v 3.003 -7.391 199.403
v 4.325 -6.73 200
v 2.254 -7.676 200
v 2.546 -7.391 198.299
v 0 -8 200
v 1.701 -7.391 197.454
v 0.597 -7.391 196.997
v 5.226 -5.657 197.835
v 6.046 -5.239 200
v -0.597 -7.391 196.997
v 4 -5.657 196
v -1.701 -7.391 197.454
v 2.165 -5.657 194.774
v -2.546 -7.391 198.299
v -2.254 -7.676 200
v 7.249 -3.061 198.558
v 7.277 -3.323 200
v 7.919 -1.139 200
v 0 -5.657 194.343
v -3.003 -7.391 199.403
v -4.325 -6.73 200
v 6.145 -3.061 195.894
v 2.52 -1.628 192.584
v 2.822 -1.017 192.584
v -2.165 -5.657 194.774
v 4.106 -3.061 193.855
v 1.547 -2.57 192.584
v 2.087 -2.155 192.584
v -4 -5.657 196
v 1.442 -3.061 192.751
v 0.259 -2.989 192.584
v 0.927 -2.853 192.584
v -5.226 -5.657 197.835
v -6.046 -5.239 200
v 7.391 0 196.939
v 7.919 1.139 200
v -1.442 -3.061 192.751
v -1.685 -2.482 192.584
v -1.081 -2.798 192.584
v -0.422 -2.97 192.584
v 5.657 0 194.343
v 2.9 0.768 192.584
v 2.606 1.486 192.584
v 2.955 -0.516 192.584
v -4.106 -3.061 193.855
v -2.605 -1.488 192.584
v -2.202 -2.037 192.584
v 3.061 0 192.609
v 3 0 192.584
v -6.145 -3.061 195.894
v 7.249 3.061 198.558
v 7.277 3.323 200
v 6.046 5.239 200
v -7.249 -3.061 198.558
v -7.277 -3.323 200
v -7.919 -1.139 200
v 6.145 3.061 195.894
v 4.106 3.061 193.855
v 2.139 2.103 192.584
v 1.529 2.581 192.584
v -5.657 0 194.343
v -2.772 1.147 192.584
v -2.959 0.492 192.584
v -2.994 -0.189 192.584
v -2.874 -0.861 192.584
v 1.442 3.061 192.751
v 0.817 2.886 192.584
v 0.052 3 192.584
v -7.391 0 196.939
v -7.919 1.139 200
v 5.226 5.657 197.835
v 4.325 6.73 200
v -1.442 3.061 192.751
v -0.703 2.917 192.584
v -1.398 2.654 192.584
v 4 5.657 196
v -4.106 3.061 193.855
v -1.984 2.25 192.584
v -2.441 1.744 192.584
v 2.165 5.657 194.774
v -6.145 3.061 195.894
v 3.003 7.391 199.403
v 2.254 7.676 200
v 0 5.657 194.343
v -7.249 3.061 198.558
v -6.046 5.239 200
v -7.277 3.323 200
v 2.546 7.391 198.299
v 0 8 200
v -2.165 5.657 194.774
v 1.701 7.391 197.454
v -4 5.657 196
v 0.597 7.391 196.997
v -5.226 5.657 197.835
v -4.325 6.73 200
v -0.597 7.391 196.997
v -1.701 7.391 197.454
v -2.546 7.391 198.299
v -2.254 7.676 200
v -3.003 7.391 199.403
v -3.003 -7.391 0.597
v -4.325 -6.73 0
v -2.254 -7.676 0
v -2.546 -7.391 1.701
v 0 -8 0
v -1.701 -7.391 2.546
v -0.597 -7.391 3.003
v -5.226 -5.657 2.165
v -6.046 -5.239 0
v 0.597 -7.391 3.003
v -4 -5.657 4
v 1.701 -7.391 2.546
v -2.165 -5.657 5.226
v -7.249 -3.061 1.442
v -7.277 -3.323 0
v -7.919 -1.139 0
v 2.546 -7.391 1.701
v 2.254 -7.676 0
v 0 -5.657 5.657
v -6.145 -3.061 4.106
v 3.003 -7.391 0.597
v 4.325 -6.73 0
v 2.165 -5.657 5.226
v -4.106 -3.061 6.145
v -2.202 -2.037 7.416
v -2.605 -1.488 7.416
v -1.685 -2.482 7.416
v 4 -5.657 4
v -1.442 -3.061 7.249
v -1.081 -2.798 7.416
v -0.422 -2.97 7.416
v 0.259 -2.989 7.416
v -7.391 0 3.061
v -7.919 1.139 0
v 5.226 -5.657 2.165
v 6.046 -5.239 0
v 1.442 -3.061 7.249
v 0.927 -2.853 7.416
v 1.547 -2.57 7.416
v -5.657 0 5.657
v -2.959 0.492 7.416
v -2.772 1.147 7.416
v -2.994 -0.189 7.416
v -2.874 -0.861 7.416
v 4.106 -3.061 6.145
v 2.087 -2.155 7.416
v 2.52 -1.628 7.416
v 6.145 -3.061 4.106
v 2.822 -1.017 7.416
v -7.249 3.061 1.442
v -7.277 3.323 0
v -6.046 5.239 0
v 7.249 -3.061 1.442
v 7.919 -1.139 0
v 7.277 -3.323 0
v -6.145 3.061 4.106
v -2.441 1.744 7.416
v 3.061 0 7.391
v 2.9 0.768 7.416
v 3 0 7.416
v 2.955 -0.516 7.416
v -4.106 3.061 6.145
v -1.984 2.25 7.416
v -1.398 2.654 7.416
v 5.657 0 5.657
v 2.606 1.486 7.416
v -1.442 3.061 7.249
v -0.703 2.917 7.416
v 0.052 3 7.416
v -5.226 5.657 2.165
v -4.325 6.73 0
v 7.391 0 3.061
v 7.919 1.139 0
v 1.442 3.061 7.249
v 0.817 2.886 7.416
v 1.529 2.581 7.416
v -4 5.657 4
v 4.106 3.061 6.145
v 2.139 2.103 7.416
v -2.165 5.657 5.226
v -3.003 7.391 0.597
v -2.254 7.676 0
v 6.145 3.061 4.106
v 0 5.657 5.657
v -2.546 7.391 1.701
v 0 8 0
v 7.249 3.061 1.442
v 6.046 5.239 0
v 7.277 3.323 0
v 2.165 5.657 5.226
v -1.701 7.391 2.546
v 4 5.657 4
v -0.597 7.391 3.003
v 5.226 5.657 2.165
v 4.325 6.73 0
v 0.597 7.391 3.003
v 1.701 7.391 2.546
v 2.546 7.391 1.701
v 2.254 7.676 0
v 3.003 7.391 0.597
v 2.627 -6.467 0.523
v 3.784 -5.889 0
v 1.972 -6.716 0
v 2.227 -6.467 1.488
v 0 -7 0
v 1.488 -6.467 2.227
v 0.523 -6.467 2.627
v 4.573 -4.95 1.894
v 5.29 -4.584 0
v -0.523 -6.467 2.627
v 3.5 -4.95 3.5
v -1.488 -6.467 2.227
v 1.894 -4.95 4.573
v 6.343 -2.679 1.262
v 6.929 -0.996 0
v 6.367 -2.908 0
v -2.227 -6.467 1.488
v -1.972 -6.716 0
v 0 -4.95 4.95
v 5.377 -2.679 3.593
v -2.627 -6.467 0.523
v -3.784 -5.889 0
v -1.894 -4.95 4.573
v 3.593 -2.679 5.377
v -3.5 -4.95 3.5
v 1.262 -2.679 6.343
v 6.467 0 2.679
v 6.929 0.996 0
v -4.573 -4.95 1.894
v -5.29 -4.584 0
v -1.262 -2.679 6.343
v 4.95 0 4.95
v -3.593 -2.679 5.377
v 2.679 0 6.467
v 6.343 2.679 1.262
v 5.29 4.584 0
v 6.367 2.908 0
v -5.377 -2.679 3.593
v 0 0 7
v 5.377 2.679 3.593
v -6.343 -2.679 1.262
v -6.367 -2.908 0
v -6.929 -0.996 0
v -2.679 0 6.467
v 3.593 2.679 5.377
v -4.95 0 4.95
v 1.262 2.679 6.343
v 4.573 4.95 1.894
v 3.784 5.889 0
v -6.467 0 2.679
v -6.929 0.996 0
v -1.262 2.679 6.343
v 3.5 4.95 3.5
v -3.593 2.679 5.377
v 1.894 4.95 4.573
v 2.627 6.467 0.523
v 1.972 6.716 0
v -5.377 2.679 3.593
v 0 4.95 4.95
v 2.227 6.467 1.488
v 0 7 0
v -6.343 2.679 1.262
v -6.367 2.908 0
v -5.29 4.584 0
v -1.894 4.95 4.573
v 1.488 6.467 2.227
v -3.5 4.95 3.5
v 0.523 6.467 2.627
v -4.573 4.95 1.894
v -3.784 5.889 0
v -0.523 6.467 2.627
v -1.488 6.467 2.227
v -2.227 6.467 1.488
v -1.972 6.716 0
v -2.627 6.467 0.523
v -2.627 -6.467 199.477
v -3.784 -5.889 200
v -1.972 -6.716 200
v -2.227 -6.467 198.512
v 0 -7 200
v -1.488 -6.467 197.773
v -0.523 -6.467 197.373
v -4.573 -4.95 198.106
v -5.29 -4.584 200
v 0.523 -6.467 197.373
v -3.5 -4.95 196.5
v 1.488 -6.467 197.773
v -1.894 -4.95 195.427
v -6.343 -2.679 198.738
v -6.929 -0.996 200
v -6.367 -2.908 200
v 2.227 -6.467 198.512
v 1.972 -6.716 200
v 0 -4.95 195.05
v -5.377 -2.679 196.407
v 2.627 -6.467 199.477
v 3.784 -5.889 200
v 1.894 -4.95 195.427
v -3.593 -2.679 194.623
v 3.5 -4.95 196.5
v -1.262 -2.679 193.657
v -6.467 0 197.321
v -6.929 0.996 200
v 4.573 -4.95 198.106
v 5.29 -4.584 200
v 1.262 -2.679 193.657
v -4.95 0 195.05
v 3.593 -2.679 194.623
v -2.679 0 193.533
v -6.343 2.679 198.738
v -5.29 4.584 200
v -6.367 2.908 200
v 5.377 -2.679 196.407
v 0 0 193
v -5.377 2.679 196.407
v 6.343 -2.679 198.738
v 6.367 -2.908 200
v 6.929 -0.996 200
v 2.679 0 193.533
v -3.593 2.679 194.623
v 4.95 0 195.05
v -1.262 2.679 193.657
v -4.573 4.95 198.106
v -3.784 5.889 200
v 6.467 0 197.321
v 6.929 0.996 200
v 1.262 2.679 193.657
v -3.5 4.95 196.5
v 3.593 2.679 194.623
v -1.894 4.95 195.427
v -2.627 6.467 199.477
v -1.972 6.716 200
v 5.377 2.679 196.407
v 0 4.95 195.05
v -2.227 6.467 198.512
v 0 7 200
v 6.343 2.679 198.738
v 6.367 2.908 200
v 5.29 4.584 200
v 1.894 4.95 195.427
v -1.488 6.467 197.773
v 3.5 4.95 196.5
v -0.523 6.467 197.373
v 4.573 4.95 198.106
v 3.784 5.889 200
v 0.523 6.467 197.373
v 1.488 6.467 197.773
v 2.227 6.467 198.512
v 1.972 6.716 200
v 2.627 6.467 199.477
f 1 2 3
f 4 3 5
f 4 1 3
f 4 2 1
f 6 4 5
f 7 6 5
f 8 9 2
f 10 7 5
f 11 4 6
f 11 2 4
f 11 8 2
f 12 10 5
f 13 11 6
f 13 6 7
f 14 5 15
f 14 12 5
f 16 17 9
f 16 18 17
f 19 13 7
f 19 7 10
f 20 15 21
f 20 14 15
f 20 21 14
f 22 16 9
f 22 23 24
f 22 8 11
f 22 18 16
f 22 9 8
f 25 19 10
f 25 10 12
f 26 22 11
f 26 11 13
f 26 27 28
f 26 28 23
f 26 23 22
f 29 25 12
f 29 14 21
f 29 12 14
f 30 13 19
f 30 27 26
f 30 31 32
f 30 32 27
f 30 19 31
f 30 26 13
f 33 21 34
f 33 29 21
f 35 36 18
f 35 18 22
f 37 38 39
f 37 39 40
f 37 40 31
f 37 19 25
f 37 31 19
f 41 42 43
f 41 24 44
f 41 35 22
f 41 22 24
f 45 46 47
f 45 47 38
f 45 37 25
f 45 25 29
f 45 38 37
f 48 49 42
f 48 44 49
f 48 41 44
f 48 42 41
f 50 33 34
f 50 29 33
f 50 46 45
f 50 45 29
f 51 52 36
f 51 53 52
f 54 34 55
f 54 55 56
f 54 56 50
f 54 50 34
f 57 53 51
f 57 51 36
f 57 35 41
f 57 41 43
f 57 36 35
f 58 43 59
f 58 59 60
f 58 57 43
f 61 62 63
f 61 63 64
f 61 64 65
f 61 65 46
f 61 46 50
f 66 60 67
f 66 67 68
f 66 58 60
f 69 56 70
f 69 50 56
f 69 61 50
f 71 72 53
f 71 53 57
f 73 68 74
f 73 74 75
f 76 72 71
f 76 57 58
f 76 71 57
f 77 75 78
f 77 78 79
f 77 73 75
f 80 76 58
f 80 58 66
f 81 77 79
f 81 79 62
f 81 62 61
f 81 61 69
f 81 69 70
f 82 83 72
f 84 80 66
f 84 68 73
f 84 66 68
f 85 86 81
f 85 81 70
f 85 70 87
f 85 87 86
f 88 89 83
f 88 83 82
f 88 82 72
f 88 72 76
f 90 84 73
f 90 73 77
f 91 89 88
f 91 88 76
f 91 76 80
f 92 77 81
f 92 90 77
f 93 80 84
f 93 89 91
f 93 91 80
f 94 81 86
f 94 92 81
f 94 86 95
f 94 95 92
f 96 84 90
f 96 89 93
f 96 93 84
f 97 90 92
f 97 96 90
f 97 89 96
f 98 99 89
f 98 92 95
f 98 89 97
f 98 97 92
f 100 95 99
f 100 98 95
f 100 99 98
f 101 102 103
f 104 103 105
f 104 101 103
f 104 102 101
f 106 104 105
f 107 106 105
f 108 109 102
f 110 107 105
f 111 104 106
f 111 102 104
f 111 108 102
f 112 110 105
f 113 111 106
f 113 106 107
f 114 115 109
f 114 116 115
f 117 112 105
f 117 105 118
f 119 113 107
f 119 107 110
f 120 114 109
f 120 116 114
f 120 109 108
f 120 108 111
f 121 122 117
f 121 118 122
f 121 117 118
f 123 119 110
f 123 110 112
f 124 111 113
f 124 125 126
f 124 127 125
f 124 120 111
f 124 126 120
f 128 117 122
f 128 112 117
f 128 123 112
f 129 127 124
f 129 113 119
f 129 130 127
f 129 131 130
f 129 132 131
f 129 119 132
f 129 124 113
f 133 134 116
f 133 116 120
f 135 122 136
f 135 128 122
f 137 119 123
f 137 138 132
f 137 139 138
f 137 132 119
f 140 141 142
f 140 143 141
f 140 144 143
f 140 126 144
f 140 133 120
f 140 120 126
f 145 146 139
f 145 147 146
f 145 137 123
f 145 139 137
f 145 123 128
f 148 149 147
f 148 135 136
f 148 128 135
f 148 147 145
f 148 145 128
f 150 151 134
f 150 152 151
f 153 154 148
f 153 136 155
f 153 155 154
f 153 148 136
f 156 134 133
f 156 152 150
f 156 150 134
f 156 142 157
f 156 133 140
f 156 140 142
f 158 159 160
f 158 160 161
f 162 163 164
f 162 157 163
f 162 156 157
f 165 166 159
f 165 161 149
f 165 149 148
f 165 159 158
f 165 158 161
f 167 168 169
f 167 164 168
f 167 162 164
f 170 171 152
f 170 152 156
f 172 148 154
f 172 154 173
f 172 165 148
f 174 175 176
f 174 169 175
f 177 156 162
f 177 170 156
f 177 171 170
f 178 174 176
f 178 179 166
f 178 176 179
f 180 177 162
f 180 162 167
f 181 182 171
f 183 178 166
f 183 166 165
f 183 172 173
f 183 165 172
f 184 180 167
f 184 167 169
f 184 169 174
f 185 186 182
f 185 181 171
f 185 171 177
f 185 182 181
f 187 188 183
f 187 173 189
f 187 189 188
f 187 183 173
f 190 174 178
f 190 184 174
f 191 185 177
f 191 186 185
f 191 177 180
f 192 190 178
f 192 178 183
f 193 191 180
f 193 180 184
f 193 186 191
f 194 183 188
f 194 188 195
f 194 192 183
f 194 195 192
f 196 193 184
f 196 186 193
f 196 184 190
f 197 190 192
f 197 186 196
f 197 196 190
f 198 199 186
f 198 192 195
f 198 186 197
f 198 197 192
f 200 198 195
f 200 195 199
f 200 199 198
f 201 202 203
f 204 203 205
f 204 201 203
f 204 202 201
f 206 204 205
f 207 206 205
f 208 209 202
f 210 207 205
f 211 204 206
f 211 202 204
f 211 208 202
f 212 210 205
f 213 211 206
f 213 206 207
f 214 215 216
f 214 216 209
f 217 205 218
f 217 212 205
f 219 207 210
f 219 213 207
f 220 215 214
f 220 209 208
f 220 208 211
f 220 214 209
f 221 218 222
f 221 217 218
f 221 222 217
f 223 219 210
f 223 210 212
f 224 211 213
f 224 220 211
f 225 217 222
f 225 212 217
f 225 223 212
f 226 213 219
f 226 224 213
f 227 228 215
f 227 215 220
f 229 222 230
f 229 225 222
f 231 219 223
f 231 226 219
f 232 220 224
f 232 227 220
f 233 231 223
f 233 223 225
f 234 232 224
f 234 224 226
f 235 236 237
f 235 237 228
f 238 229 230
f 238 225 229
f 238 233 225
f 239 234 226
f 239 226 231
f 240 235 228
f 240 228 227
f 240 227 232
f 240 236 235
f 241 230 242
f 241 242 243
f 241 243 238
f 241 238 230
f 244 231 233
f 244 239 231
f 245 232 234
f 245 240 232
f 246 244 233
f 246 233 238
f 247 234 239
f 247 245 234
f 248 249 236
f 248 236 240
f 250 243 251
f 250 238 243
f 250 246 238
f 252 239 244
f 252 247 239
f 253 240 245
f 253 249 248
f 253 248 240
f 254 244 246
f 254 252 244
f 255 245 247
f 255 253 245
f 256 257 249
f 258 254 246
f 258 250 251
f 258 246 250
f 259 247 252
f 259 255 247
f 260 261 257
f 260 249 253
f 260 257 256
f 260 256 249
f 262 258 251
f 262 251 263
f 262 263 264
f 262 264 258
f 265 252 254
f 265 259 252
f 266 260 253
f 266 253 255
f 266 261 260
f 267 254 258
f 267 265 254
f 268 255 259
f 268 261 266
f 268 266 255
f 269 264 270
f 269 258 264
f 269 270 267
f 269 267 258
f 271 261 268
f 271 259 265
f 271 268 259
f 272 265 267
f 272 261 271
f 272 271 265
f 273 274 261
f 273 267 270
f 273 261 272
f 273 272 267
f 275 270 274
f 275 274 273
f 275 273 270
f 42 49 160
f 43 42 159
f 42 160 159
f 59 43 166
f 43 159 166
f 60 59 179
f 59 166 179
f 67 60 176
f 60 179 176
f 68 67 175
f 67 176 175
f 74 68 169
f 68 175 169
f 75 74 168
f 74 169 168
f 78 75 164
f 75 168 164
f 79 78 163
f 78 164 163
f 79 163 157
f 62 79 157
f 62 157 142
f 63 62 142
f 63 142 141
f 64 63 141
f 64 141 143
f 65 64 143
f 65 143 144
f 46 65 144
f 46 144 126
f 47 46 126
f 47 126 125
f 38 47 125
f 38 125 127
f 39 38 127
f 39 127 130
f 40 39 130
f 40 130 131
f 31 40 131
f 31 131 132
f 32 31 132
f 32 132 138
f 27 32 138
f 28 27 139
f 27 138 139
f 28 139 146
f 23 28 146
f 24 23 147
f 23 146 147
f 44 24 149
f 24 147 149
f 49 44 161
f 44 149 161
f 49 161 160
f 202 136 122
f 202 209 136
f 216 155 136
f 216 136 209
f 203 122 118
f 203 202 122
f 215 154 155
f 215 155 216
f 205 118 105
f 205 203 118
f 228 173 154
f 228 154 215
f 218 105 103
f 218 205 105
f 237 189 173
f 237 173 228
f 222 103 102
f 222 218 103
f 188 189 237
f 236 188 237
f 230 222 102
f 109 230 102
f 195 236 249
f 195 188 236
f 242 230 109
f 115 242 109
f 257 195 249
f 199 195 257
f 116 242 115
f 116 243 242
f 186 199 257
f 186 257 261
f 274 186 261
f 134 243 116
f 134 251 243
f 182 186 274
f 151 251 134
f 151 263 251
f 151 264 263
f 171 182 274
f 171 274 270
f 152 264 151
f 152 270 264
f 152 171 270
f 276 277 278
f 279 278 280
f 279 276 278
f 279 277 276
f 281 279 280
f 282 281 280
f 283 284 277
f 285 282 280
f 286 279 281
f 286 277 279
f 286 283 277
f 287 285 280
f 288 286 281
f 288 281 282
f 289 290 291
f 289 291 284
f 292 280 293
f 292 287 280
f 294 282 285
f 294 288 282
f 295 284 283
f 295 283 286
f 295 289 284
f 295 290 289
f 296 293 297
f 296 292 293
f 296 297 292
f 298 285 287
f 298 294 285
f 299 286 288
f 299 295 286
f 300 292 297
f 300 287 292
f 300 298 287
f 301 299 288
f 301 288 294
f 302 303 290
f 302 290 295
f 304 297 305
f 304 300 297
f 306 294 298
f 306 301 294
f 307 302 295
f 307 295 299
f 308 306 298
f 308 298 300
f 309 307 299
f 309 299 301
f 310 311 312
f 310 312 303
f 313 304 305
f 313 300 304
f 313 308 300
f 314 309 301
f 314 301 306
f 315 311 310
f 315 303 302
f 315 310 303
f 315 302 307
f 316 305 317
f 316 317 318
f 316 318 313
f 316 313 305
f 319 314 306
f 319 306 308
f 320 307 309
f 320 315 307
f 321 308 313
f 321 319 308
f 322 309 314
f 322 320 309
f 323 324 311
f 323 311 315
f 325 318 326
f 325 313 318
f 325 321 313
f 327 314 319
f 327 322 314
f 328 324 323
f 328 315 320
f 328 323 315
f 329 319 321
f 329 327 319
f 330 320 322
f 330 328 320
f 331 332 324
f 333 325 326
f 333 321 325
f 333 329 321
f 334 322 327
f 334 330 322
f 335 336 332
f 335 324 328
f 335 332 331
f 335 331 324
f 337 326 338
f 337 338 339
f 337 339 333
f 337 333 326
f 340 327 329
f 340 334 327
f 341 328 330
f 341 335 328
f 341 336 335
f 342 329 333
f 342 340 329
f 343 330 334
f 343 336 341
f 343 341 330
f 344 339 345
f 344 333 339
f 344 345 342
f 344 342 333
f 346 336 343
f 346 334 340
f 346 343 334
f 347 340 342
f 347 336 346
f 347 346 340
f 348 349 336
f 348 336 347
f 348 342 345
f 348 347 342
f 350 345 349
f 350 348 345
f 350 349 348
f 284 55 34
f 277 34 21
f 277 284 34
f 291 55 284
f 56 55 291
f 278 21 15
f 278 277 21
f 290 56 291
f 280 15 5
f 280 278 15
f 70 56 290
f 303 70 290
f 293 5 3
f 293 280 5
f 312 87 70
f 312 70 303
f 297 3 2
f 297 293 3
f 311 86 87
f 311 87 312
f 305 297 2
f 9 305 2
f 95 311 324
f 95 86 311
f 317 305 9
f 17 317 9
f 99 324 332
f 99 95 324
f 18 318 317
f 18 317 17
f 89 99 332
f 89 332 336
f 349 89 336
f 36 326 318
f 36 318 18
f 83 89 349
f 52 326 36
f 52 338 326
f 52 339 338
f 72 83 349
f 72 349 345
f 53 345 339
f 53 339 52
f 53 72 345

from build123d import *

# Parameters (mm, degrees)
SKETCH1_R           = 3
BOSS_EXTRUDE1_DEPTH = 200
REVOLVE1_ANGLE      = 180
REVOLVE2_ANGLE      = 180


with BuildPart() as part:
    # Sketch1 → Boss-Extrude1 (new body)
    with BuildSketch(Plane.XY):
        Circle(SKETCH1_R)
    extrude(amount=BOSS_EXTRUDE1_DEPTH)

    # Sketch2 → Revolve1 (revolve)
    with BuildSketch(Plane.XY.offset(200)):
        with BuildLine():
            Line((0, 8), (0, 7))
            Line((0, 7), (0, -7))
            Line((0, -7), (0, -8))
            ThreePointArc((0, -8), (8, 0), (0, 8))
        make_face()
    revolve(axis=Axis((0, 8, 200), (0, 1, 0)), revolution_arc=REVOLVE1_ANGLE)

    # Sketch3 → Cut-Revolve1 (revolve, cut)
    with BuildSketch(Plane.XY.offset(200)):
        with BuildLine():
            Line((0, 7), (0, -7))
            ThreePointArc((0, -7), (7, 0), (0, 7))
        make_face()
    revolve(axis=Axis((0, 7, 200), (0, -1, 0)), mode=Mode.SUBTRACT)

    # Sketch4 → Revolve2 (revolve)
    with BuildSketch(Plane(origin=(0, 0, 0), x_dir=(-1, 0, 0), z_dir=(0, 0, -1))):
        with BuildLine():
            Line((0, 8), (0, -8))
            ThreePointArc((0, -8), (8, 0), (0, 8))
        make_face()
    revolve(axis=Axis((0, 8, 0), (0, 1, 0)), revolution_arc=REVOLVE2_ANGLE)

    # Sketch5 → Cut-Revolve2 (revolve, cut)
    with BuildSketch(Plane(origin=(0, 0, 0), x_dir=(-1, 0, 0), z_dir=(0, 0, -1))):
        with BuildLine():
            Line((0, 7), (0, -7))
            ThreePointArc((0, -7), (7, 0), (0, 7))
        make_face()
    revolve(axis=Axis((0, 7, 0), (0, -1, 0)), mode=Mode.SUBTRACT)


solid = part.part
